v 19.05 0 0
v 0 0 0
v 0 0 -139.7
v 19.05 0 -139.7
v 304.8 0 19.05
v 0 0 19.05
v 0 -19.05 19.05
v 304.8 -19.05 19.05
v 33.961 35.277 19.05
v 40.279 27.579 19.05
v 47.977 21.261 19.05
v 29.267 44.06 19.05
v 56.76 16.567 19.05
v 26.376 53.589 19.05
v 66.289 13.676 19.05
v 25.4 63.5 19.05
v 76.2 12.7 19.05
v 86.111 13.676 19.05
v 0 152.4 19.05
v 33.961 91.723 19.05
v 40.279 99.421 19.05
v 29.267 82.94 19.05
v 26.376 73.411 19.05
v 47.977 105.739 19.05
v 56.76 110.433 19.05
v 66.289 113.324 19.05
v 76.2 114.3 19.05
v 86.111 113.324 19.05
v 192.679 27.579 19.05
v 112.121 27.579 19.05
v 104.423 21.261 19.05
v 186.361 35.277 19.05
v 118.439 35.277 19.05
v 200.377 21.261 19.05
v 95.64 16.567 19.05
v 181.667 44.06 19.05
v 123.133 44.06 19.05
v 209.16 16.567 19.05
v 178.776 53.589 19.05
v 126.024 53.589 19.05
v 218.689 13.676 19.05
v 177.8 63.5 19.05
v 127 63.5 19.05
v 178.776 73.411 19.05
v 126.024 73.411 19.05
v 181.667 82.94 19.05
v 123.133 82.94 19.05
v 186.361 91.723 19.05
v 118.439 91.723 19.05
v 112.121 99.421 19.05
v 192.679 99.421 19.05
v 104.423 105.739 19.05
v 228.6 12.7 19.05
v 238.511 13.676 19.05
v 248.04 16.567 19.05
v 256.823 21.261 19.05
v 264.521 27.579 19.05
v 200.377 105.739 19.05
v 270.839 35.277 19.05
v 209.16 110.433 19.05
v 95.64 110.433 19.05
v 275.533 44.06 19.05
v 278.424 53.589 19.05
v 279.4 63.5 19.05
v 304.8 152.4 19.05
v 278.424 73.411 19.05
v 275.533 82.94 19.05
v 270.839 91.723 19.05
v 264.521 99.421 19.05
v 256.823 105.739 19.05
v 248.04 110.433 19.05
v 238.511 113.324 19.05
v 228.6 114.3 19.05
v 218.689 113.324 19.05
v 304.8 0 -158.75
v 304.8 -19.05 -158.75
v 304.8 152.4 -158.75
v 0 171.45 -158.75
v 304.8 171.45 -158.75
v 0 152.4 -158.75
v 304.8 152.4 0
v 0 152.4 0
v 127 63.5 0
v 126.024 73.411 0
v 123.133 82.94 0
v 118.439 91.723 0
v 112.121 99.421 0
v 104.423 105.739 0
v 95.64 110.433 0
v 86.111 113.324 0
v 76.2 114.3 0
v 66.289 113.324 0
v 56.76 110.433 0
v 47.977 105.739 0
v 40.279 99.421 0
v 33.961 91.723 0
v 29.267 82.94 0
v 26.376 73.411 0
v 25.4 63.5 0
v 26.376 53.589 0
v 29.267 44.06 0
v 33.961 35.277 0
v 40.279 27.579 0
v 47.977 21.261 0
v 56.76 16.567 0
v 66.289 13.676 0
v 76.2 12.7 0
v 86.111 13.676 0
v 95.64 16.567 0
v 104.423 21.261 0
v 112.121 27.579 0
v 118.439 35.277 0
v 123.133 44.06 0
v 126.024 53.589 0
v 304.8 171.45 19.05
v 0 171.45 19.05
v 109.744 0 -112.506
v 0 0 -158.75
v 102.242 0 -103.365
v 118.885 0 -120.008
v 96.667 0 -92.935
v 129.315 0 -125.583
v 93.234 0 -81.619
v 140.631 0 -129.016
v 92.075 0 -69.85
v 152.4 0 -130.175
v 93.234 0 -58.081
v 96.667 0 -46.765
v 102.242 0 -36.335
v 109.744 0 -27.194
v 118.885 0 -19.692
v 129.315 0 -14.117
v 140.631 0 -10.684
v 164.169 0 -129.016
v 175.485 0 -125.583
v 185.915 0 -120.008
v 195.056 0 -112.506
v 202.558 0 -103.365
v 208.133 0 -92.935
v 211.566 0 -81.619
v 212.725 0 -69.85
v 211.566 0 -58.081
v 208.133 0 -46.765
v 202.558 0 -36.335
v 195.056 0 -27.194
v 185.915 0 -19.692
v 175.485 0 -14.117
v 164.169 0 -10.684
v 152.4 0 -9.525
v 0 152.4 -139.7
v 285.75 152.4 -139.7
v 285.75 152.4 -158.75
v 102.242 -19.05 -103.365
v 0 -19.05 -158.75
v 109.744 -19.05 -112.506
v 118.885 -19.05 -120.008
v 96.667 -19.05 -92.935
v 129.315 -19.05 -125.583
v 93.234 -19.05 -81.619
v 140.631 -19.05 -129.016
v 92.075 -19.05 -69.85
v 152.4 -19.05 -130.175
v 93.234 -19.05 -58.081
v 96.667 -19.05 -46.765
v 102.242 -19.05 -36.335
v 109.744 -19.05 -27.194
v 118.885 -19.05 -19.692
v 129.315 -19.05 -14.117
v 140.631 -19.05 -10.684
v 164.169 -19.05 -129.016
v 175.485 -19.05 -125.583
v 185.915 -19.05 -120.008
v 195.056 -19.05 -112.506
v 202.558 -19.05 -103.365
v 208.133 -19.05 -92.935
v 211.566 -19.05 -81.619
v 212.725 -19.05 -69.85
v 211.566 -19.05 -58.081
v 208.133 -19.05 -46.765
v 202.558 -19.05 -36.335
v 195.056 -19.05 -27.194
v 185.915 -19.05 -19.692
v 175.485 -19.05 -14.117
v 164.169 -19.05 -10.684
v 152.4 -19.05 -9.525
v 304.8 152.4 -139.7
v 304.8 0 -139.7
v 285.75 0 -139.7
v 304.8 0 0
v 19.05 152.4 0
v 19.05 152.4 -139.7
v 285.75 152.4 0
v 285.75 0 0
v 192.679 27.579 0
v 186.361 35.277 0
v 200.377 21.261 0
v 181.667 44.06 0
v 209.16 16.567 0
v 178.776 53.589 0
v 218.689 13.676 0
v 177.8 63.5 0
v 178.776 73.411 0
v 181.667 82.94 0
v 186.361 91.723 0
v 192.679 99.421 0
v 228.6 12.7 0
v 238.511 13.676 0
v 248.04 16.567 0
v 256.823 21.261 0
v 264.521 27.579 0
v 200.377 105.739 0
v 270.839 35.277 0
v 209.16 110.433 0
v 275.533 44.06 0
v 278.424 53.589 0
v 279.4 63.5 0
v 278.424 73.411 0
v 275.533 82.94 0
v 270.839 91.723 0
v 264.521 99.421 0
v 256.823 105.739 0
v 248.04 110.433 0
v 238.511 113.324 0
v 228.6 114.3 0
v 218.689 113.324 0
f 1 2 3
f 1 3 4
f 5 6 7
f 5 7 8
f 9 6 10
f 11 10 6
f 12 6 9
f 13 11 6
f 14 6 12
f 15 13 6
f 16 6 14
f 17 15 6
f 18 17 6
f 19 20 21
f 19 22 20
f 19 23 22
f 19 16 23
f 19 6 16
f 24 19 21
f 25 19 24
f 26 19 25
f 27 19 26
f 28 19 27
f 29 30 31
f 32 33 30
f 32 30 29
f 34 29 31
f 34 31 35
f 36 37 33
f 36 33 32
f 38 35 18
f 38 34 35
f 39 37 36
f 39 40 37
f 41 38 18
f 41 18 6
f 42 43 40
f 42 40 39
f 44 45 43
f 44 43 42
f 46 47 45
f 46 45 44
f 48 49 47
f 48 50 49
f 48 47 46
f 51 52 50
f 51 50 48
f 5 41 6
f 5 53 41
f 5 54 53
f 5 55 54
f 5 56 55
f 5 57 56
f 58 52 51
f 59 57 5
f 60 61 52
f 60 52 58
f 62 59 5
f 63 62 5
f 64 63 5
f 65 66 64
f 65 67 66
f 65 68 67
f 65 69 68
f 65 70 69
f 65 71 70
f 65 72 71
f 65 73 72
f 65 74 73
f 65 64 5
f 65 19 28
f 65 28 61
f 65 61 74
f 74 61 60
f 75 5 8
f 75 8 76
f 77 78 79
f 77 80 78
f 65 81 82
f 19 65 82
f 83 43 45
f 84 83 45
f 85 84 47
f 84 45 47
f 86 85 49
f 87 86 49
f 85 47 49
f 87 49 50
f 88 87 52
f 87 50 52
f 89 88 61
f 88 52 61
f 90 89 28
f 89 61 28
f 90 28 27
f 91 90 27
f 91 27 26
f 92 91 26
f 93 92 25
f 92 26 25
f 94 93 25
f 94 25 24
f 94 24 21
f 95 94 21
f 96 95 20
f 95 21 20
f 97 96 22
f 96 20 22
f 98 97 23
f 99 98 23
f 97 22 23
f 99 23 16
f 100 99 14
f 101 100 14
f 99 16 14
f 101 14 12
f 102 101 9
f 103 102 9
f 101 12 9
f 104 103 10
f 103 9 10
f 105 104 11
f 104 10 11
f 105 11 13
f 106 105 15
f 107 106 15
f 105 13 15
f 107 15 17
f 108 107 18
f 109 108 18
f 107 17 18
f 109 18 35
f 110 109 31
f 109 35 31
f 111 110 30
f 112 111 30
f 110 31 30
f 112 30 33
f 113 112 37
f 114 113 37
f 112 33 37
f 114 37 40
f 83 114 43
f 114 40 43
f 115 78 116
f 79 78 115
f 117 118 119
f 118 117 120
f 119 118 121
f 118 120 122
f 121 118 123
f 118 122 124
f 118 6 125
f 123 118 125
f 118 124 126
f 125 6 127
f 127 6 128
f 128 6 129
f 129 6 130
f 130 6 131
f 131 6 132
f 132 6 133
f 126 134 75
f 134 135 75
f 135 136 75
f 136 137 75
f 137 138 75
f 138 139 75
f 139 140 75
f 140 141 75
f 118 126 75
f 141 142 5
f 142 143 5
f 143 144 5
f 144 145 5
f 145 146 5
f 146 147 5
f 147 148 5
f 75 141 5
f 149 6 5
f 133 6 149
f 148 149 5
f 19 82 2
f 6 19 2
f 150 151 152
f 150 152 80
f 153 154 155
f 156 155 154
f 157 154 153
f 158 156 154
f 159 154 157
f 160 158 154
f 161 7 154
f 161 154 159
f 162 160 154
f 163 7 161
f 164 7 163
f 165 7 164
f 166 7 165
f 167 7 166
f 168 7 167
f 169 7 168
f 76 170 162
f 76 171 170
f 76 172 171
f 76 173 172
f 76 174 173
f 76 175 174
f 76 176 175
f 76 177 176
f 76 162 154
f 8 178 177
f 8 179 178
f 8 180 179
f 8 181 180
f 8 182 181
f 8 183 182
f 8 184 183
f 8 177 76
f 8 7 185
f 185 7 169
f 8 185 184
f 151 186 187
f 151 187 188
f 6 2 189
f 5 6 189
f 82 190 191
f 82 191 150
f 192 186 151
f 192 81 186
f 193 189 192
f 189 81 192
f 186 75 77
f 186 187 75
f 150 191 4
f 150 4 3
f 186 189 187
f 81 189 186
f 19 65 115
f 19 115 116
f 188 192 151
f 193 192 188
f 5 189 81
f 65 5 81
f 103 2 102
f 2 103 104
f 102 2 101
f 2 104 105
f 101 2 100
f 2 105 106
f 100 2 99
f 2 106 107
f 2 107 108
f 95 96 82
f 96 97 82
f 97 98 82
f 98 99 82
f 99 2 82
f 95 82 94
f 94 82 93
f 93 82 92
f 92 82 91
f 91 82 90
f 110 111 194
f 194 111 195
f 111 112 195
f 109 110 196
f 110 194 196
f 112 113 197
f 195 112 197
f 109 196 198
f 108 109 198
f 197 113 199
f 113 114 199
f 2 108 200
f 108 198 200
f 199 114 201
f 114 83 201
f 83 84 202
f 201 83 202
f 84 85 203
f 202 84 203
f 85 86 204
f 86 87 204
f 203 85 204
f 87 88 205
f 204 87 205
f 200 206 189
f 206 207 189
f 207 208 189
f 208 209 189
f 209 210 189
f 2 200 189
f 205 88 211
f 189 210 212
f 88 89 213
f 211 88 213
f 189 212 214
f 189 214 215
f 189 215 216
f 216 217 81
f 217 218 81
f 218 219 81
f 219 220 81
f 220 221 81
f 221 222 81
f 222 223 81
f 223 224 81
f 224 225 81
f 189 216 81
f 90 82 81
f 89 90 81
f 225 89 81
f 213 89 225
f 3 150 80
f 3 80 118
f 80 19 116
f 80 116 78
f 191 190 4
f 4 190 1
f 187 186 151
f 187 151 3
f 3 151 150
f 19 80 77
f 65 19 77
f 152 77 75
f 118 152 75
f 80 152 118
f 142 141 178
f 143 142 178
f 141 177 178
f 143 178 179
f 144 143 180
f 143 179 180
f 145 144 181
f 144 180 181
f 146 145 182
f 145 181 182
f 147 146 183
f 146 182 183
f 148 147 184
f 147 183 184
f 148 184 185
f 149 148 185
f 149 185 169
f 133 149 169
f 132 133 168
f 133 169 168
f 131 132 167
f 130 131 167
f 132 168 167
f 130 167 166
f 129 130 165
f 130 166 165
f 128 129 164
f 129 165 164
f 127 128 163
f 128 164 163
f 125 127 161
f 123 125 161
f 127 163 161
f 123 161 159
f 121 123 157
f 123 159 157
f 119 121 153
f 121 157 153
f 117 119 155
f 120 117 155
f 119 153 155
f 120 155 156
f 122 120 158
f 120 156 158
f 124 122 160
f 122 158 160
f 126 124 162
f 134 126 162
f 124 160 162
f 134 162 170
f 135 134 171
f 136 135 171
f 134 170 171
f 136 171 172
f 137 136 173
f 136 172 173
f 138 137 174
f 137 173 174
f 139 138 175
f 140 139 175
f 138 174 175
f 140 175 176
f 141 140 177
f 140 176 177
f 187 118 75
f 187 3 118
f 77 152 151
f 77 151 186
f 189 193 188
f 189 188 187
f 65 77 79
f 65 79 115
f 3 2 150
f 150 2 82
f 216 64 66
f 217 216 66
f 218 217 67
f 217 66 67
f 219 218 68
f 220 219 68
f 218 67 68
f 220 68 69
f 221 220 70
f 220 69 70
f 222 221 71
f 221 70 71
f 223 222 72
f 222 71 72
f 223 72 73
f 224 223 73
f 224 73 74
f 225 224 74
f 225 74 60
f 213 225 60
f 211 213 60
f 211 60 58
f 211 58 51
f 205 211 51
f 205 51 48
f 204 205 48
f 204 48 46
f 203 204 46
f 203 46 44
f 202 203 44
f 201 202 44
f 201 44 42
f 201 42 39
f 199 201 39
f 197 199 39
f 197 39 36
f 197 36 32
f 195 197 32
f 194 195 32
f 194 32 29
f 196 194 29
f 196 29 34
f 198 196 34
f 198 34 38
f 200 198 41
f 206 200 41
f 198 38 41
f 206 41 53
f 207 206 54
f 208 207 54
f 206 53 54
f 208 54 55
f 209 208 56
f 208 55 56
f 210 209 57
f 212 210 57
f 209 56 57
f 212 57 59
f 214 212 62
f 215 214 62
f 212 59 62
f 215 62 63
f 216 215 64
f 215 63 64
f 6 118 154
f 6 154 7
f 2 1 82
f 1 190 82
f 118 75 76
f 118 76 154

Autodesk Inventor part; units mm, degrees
ref_plane "YZ Plane" through (0, 0, 0) normal (1, 0, 0) x (0, 1, 0)
ref_plane "XZ Plane" through (0, 0, 0) normal (0, 1, 0) x (-1, 0, 0)
ref_plane "XY Plane" through (0, 0, 0) normal (0, 0, 1) x (1, 0, 0)
sketch "Sketch3" plane through (0, 0, 0) normal (0, 0, 1) x (1, 0, 0)
  line L0 (0, 0) -> (304.8, 0)
  line L1 (304.8, 0) -> (304.8, 152.4)
  line L2 (304.8, 152.4) -> (0, 152.4)
  line L3 (0, 152.4) -> (0, 0)
  dimension "d12" = 304.8
  dimension "d13" = 152.4
extrude "Extrusion3" add sketch "Sketch3" along normal blind 19.05
sketch "Sketch4" plane through (0, 0, 19.05) normal (0, 0, 1) x (1, 0, 0)
  circle A0 centre (76.2, 63.5) radius 50.8
  circle A1 centre (228.6, 63.5) radius 50.8
  line L0 (0, 152.4) -> (0, 0) projected
  line L1 (304.8, 152.4) -> (0, 152.4) projected
  line L2 (304.8, 0) -> (304.8, 152.4) projected
  dimension "d16" = 101.6
  dimension "d17" = 101.6
  dimension "d18" = 76.2
  dimension "d19" = 88.9
  dimension "d20" = 88.9
  dimension "d21" = 76.2
extrude "Extrusion4" cut sketch "Sketch4" against normal blind 25.4
sketch "Sketch5" plane through (0, 152.4, 0) normal (0, 1, 0) x (1, 0, 0)
  line L0 (304.8, -19.05) -> (0, -19.05) projected
  line L1 (304.8, -19.05) -> (0, -19.05)
  line L2 (0, -19.05) -> (0, 158.75)
  line L3 (0, 158.75) -> (304.8, 158.75)
  line L4 (304.8, 158.75) -> (304.8, -19.05)
  point P0 (0, 0)
  dimension "d24" = 177.8
extrude "Extrusion5" add sketch "Sketch5" along normal blind 19.05 separate body
sketch "Sketch6" plane through (0, 0, 0) normal (0, -1, 0) x (1, 0, 0)
  line L0 (0, -158.75) -> (0, 19.05) projected
  line L1 (304.8, 19.05) -> (304.8, -158.75) projected
  line L2 (0, 19.05) -> (304.8, 19.05)
  line L3 (304.8, 19.05) -> (304.8, -158.75)
  line L4 (304.8, -158.75) -> (0, -158.75)
  line L5 (0, -158.75) -> (0, 19.05)
  point P0 (0, 0)
extrude "Extrusion6" add sketch "Sketch6" along normal blind 19.05 separate body
sketch "Sketch7" plane through (0, -19.05, 0) normal (0, -1, 0) x (1, 0, 0)
  circle A0 centre (152.4, -69.85) radius 60.325
  line L0 (0, 19.05) -> (0, -158.75) projected
  line L1 (304.8, -158.75) -> (0, -158.75) projected
  point P0 (0, 0)
  dimension "d29" = 120.65
  dimension "d30" = 152.4
  dimension "d31" = 88.9
extrude "Extrusion7" cut sketch "Sketch7" against normal blind 25.4 bodies 3
sketch "Sketch8" plane through (0, 0, 0) normal (0, 0, -1) x (-1, 0, 0)
  line L0 (-304.8, 152.4) -> (0, 152.4) projected
  line L1 (0, 0) -> (-304.8, 0) projected
  line L2 (0, 152.4) -> (-19.05, 152.4)
  line L3 (-19.05, 152.4) -> (-19.05, 0)
  line L4 (-19.05, 0) -> (0, 0)
  line L5 (0, 0) -> (0, 152.4)
  dimension "d34" = 19.05
extrude "Extrusion8" add sketch "Sketch8" along normal blind 139.7 separate body
sketch "Sketch9" plane through (0, 0, 0) normal (0, 0, -1) x (-1, 0, 0)
  line L0 (0, 0) -> (-304.8, 0) projected
  line L1 (-304.8, 152.4) -> (-285.75, 152.4)
  line L2 (-285.75, 152.4) -> (-285.75, 0)
  line L3 (-285.75, 0) -> (-304.8, 0)
  line L4 (-304.8, 0) -> (-304.8, 152.4)
  dimension "d37" = 19.05
extrude "Extrusion9" add sketch "Sketch9" along normal blind 139.7 separate body
sketch "Sketch10" plane through (0, 0, -139.7) normal (0, 0, -1) x (-1, 0, 0)
  line L0 (-285.75, 152.4) -> (-304.8, 152.4) projected
  line L1 (-304.8, 152.4) -> (0, 152.4)
  line L2 (0, 152.4) -> (0, 0)
  line L3 (0, 0) -> (-304.8, 0)
  line L4 (-304.8, 0) -> (-304.8, 152.4)
extrude "Extrusion10" add sketch "Sketch10" along normal blind 19.05 separate body
properties part number "Front"
